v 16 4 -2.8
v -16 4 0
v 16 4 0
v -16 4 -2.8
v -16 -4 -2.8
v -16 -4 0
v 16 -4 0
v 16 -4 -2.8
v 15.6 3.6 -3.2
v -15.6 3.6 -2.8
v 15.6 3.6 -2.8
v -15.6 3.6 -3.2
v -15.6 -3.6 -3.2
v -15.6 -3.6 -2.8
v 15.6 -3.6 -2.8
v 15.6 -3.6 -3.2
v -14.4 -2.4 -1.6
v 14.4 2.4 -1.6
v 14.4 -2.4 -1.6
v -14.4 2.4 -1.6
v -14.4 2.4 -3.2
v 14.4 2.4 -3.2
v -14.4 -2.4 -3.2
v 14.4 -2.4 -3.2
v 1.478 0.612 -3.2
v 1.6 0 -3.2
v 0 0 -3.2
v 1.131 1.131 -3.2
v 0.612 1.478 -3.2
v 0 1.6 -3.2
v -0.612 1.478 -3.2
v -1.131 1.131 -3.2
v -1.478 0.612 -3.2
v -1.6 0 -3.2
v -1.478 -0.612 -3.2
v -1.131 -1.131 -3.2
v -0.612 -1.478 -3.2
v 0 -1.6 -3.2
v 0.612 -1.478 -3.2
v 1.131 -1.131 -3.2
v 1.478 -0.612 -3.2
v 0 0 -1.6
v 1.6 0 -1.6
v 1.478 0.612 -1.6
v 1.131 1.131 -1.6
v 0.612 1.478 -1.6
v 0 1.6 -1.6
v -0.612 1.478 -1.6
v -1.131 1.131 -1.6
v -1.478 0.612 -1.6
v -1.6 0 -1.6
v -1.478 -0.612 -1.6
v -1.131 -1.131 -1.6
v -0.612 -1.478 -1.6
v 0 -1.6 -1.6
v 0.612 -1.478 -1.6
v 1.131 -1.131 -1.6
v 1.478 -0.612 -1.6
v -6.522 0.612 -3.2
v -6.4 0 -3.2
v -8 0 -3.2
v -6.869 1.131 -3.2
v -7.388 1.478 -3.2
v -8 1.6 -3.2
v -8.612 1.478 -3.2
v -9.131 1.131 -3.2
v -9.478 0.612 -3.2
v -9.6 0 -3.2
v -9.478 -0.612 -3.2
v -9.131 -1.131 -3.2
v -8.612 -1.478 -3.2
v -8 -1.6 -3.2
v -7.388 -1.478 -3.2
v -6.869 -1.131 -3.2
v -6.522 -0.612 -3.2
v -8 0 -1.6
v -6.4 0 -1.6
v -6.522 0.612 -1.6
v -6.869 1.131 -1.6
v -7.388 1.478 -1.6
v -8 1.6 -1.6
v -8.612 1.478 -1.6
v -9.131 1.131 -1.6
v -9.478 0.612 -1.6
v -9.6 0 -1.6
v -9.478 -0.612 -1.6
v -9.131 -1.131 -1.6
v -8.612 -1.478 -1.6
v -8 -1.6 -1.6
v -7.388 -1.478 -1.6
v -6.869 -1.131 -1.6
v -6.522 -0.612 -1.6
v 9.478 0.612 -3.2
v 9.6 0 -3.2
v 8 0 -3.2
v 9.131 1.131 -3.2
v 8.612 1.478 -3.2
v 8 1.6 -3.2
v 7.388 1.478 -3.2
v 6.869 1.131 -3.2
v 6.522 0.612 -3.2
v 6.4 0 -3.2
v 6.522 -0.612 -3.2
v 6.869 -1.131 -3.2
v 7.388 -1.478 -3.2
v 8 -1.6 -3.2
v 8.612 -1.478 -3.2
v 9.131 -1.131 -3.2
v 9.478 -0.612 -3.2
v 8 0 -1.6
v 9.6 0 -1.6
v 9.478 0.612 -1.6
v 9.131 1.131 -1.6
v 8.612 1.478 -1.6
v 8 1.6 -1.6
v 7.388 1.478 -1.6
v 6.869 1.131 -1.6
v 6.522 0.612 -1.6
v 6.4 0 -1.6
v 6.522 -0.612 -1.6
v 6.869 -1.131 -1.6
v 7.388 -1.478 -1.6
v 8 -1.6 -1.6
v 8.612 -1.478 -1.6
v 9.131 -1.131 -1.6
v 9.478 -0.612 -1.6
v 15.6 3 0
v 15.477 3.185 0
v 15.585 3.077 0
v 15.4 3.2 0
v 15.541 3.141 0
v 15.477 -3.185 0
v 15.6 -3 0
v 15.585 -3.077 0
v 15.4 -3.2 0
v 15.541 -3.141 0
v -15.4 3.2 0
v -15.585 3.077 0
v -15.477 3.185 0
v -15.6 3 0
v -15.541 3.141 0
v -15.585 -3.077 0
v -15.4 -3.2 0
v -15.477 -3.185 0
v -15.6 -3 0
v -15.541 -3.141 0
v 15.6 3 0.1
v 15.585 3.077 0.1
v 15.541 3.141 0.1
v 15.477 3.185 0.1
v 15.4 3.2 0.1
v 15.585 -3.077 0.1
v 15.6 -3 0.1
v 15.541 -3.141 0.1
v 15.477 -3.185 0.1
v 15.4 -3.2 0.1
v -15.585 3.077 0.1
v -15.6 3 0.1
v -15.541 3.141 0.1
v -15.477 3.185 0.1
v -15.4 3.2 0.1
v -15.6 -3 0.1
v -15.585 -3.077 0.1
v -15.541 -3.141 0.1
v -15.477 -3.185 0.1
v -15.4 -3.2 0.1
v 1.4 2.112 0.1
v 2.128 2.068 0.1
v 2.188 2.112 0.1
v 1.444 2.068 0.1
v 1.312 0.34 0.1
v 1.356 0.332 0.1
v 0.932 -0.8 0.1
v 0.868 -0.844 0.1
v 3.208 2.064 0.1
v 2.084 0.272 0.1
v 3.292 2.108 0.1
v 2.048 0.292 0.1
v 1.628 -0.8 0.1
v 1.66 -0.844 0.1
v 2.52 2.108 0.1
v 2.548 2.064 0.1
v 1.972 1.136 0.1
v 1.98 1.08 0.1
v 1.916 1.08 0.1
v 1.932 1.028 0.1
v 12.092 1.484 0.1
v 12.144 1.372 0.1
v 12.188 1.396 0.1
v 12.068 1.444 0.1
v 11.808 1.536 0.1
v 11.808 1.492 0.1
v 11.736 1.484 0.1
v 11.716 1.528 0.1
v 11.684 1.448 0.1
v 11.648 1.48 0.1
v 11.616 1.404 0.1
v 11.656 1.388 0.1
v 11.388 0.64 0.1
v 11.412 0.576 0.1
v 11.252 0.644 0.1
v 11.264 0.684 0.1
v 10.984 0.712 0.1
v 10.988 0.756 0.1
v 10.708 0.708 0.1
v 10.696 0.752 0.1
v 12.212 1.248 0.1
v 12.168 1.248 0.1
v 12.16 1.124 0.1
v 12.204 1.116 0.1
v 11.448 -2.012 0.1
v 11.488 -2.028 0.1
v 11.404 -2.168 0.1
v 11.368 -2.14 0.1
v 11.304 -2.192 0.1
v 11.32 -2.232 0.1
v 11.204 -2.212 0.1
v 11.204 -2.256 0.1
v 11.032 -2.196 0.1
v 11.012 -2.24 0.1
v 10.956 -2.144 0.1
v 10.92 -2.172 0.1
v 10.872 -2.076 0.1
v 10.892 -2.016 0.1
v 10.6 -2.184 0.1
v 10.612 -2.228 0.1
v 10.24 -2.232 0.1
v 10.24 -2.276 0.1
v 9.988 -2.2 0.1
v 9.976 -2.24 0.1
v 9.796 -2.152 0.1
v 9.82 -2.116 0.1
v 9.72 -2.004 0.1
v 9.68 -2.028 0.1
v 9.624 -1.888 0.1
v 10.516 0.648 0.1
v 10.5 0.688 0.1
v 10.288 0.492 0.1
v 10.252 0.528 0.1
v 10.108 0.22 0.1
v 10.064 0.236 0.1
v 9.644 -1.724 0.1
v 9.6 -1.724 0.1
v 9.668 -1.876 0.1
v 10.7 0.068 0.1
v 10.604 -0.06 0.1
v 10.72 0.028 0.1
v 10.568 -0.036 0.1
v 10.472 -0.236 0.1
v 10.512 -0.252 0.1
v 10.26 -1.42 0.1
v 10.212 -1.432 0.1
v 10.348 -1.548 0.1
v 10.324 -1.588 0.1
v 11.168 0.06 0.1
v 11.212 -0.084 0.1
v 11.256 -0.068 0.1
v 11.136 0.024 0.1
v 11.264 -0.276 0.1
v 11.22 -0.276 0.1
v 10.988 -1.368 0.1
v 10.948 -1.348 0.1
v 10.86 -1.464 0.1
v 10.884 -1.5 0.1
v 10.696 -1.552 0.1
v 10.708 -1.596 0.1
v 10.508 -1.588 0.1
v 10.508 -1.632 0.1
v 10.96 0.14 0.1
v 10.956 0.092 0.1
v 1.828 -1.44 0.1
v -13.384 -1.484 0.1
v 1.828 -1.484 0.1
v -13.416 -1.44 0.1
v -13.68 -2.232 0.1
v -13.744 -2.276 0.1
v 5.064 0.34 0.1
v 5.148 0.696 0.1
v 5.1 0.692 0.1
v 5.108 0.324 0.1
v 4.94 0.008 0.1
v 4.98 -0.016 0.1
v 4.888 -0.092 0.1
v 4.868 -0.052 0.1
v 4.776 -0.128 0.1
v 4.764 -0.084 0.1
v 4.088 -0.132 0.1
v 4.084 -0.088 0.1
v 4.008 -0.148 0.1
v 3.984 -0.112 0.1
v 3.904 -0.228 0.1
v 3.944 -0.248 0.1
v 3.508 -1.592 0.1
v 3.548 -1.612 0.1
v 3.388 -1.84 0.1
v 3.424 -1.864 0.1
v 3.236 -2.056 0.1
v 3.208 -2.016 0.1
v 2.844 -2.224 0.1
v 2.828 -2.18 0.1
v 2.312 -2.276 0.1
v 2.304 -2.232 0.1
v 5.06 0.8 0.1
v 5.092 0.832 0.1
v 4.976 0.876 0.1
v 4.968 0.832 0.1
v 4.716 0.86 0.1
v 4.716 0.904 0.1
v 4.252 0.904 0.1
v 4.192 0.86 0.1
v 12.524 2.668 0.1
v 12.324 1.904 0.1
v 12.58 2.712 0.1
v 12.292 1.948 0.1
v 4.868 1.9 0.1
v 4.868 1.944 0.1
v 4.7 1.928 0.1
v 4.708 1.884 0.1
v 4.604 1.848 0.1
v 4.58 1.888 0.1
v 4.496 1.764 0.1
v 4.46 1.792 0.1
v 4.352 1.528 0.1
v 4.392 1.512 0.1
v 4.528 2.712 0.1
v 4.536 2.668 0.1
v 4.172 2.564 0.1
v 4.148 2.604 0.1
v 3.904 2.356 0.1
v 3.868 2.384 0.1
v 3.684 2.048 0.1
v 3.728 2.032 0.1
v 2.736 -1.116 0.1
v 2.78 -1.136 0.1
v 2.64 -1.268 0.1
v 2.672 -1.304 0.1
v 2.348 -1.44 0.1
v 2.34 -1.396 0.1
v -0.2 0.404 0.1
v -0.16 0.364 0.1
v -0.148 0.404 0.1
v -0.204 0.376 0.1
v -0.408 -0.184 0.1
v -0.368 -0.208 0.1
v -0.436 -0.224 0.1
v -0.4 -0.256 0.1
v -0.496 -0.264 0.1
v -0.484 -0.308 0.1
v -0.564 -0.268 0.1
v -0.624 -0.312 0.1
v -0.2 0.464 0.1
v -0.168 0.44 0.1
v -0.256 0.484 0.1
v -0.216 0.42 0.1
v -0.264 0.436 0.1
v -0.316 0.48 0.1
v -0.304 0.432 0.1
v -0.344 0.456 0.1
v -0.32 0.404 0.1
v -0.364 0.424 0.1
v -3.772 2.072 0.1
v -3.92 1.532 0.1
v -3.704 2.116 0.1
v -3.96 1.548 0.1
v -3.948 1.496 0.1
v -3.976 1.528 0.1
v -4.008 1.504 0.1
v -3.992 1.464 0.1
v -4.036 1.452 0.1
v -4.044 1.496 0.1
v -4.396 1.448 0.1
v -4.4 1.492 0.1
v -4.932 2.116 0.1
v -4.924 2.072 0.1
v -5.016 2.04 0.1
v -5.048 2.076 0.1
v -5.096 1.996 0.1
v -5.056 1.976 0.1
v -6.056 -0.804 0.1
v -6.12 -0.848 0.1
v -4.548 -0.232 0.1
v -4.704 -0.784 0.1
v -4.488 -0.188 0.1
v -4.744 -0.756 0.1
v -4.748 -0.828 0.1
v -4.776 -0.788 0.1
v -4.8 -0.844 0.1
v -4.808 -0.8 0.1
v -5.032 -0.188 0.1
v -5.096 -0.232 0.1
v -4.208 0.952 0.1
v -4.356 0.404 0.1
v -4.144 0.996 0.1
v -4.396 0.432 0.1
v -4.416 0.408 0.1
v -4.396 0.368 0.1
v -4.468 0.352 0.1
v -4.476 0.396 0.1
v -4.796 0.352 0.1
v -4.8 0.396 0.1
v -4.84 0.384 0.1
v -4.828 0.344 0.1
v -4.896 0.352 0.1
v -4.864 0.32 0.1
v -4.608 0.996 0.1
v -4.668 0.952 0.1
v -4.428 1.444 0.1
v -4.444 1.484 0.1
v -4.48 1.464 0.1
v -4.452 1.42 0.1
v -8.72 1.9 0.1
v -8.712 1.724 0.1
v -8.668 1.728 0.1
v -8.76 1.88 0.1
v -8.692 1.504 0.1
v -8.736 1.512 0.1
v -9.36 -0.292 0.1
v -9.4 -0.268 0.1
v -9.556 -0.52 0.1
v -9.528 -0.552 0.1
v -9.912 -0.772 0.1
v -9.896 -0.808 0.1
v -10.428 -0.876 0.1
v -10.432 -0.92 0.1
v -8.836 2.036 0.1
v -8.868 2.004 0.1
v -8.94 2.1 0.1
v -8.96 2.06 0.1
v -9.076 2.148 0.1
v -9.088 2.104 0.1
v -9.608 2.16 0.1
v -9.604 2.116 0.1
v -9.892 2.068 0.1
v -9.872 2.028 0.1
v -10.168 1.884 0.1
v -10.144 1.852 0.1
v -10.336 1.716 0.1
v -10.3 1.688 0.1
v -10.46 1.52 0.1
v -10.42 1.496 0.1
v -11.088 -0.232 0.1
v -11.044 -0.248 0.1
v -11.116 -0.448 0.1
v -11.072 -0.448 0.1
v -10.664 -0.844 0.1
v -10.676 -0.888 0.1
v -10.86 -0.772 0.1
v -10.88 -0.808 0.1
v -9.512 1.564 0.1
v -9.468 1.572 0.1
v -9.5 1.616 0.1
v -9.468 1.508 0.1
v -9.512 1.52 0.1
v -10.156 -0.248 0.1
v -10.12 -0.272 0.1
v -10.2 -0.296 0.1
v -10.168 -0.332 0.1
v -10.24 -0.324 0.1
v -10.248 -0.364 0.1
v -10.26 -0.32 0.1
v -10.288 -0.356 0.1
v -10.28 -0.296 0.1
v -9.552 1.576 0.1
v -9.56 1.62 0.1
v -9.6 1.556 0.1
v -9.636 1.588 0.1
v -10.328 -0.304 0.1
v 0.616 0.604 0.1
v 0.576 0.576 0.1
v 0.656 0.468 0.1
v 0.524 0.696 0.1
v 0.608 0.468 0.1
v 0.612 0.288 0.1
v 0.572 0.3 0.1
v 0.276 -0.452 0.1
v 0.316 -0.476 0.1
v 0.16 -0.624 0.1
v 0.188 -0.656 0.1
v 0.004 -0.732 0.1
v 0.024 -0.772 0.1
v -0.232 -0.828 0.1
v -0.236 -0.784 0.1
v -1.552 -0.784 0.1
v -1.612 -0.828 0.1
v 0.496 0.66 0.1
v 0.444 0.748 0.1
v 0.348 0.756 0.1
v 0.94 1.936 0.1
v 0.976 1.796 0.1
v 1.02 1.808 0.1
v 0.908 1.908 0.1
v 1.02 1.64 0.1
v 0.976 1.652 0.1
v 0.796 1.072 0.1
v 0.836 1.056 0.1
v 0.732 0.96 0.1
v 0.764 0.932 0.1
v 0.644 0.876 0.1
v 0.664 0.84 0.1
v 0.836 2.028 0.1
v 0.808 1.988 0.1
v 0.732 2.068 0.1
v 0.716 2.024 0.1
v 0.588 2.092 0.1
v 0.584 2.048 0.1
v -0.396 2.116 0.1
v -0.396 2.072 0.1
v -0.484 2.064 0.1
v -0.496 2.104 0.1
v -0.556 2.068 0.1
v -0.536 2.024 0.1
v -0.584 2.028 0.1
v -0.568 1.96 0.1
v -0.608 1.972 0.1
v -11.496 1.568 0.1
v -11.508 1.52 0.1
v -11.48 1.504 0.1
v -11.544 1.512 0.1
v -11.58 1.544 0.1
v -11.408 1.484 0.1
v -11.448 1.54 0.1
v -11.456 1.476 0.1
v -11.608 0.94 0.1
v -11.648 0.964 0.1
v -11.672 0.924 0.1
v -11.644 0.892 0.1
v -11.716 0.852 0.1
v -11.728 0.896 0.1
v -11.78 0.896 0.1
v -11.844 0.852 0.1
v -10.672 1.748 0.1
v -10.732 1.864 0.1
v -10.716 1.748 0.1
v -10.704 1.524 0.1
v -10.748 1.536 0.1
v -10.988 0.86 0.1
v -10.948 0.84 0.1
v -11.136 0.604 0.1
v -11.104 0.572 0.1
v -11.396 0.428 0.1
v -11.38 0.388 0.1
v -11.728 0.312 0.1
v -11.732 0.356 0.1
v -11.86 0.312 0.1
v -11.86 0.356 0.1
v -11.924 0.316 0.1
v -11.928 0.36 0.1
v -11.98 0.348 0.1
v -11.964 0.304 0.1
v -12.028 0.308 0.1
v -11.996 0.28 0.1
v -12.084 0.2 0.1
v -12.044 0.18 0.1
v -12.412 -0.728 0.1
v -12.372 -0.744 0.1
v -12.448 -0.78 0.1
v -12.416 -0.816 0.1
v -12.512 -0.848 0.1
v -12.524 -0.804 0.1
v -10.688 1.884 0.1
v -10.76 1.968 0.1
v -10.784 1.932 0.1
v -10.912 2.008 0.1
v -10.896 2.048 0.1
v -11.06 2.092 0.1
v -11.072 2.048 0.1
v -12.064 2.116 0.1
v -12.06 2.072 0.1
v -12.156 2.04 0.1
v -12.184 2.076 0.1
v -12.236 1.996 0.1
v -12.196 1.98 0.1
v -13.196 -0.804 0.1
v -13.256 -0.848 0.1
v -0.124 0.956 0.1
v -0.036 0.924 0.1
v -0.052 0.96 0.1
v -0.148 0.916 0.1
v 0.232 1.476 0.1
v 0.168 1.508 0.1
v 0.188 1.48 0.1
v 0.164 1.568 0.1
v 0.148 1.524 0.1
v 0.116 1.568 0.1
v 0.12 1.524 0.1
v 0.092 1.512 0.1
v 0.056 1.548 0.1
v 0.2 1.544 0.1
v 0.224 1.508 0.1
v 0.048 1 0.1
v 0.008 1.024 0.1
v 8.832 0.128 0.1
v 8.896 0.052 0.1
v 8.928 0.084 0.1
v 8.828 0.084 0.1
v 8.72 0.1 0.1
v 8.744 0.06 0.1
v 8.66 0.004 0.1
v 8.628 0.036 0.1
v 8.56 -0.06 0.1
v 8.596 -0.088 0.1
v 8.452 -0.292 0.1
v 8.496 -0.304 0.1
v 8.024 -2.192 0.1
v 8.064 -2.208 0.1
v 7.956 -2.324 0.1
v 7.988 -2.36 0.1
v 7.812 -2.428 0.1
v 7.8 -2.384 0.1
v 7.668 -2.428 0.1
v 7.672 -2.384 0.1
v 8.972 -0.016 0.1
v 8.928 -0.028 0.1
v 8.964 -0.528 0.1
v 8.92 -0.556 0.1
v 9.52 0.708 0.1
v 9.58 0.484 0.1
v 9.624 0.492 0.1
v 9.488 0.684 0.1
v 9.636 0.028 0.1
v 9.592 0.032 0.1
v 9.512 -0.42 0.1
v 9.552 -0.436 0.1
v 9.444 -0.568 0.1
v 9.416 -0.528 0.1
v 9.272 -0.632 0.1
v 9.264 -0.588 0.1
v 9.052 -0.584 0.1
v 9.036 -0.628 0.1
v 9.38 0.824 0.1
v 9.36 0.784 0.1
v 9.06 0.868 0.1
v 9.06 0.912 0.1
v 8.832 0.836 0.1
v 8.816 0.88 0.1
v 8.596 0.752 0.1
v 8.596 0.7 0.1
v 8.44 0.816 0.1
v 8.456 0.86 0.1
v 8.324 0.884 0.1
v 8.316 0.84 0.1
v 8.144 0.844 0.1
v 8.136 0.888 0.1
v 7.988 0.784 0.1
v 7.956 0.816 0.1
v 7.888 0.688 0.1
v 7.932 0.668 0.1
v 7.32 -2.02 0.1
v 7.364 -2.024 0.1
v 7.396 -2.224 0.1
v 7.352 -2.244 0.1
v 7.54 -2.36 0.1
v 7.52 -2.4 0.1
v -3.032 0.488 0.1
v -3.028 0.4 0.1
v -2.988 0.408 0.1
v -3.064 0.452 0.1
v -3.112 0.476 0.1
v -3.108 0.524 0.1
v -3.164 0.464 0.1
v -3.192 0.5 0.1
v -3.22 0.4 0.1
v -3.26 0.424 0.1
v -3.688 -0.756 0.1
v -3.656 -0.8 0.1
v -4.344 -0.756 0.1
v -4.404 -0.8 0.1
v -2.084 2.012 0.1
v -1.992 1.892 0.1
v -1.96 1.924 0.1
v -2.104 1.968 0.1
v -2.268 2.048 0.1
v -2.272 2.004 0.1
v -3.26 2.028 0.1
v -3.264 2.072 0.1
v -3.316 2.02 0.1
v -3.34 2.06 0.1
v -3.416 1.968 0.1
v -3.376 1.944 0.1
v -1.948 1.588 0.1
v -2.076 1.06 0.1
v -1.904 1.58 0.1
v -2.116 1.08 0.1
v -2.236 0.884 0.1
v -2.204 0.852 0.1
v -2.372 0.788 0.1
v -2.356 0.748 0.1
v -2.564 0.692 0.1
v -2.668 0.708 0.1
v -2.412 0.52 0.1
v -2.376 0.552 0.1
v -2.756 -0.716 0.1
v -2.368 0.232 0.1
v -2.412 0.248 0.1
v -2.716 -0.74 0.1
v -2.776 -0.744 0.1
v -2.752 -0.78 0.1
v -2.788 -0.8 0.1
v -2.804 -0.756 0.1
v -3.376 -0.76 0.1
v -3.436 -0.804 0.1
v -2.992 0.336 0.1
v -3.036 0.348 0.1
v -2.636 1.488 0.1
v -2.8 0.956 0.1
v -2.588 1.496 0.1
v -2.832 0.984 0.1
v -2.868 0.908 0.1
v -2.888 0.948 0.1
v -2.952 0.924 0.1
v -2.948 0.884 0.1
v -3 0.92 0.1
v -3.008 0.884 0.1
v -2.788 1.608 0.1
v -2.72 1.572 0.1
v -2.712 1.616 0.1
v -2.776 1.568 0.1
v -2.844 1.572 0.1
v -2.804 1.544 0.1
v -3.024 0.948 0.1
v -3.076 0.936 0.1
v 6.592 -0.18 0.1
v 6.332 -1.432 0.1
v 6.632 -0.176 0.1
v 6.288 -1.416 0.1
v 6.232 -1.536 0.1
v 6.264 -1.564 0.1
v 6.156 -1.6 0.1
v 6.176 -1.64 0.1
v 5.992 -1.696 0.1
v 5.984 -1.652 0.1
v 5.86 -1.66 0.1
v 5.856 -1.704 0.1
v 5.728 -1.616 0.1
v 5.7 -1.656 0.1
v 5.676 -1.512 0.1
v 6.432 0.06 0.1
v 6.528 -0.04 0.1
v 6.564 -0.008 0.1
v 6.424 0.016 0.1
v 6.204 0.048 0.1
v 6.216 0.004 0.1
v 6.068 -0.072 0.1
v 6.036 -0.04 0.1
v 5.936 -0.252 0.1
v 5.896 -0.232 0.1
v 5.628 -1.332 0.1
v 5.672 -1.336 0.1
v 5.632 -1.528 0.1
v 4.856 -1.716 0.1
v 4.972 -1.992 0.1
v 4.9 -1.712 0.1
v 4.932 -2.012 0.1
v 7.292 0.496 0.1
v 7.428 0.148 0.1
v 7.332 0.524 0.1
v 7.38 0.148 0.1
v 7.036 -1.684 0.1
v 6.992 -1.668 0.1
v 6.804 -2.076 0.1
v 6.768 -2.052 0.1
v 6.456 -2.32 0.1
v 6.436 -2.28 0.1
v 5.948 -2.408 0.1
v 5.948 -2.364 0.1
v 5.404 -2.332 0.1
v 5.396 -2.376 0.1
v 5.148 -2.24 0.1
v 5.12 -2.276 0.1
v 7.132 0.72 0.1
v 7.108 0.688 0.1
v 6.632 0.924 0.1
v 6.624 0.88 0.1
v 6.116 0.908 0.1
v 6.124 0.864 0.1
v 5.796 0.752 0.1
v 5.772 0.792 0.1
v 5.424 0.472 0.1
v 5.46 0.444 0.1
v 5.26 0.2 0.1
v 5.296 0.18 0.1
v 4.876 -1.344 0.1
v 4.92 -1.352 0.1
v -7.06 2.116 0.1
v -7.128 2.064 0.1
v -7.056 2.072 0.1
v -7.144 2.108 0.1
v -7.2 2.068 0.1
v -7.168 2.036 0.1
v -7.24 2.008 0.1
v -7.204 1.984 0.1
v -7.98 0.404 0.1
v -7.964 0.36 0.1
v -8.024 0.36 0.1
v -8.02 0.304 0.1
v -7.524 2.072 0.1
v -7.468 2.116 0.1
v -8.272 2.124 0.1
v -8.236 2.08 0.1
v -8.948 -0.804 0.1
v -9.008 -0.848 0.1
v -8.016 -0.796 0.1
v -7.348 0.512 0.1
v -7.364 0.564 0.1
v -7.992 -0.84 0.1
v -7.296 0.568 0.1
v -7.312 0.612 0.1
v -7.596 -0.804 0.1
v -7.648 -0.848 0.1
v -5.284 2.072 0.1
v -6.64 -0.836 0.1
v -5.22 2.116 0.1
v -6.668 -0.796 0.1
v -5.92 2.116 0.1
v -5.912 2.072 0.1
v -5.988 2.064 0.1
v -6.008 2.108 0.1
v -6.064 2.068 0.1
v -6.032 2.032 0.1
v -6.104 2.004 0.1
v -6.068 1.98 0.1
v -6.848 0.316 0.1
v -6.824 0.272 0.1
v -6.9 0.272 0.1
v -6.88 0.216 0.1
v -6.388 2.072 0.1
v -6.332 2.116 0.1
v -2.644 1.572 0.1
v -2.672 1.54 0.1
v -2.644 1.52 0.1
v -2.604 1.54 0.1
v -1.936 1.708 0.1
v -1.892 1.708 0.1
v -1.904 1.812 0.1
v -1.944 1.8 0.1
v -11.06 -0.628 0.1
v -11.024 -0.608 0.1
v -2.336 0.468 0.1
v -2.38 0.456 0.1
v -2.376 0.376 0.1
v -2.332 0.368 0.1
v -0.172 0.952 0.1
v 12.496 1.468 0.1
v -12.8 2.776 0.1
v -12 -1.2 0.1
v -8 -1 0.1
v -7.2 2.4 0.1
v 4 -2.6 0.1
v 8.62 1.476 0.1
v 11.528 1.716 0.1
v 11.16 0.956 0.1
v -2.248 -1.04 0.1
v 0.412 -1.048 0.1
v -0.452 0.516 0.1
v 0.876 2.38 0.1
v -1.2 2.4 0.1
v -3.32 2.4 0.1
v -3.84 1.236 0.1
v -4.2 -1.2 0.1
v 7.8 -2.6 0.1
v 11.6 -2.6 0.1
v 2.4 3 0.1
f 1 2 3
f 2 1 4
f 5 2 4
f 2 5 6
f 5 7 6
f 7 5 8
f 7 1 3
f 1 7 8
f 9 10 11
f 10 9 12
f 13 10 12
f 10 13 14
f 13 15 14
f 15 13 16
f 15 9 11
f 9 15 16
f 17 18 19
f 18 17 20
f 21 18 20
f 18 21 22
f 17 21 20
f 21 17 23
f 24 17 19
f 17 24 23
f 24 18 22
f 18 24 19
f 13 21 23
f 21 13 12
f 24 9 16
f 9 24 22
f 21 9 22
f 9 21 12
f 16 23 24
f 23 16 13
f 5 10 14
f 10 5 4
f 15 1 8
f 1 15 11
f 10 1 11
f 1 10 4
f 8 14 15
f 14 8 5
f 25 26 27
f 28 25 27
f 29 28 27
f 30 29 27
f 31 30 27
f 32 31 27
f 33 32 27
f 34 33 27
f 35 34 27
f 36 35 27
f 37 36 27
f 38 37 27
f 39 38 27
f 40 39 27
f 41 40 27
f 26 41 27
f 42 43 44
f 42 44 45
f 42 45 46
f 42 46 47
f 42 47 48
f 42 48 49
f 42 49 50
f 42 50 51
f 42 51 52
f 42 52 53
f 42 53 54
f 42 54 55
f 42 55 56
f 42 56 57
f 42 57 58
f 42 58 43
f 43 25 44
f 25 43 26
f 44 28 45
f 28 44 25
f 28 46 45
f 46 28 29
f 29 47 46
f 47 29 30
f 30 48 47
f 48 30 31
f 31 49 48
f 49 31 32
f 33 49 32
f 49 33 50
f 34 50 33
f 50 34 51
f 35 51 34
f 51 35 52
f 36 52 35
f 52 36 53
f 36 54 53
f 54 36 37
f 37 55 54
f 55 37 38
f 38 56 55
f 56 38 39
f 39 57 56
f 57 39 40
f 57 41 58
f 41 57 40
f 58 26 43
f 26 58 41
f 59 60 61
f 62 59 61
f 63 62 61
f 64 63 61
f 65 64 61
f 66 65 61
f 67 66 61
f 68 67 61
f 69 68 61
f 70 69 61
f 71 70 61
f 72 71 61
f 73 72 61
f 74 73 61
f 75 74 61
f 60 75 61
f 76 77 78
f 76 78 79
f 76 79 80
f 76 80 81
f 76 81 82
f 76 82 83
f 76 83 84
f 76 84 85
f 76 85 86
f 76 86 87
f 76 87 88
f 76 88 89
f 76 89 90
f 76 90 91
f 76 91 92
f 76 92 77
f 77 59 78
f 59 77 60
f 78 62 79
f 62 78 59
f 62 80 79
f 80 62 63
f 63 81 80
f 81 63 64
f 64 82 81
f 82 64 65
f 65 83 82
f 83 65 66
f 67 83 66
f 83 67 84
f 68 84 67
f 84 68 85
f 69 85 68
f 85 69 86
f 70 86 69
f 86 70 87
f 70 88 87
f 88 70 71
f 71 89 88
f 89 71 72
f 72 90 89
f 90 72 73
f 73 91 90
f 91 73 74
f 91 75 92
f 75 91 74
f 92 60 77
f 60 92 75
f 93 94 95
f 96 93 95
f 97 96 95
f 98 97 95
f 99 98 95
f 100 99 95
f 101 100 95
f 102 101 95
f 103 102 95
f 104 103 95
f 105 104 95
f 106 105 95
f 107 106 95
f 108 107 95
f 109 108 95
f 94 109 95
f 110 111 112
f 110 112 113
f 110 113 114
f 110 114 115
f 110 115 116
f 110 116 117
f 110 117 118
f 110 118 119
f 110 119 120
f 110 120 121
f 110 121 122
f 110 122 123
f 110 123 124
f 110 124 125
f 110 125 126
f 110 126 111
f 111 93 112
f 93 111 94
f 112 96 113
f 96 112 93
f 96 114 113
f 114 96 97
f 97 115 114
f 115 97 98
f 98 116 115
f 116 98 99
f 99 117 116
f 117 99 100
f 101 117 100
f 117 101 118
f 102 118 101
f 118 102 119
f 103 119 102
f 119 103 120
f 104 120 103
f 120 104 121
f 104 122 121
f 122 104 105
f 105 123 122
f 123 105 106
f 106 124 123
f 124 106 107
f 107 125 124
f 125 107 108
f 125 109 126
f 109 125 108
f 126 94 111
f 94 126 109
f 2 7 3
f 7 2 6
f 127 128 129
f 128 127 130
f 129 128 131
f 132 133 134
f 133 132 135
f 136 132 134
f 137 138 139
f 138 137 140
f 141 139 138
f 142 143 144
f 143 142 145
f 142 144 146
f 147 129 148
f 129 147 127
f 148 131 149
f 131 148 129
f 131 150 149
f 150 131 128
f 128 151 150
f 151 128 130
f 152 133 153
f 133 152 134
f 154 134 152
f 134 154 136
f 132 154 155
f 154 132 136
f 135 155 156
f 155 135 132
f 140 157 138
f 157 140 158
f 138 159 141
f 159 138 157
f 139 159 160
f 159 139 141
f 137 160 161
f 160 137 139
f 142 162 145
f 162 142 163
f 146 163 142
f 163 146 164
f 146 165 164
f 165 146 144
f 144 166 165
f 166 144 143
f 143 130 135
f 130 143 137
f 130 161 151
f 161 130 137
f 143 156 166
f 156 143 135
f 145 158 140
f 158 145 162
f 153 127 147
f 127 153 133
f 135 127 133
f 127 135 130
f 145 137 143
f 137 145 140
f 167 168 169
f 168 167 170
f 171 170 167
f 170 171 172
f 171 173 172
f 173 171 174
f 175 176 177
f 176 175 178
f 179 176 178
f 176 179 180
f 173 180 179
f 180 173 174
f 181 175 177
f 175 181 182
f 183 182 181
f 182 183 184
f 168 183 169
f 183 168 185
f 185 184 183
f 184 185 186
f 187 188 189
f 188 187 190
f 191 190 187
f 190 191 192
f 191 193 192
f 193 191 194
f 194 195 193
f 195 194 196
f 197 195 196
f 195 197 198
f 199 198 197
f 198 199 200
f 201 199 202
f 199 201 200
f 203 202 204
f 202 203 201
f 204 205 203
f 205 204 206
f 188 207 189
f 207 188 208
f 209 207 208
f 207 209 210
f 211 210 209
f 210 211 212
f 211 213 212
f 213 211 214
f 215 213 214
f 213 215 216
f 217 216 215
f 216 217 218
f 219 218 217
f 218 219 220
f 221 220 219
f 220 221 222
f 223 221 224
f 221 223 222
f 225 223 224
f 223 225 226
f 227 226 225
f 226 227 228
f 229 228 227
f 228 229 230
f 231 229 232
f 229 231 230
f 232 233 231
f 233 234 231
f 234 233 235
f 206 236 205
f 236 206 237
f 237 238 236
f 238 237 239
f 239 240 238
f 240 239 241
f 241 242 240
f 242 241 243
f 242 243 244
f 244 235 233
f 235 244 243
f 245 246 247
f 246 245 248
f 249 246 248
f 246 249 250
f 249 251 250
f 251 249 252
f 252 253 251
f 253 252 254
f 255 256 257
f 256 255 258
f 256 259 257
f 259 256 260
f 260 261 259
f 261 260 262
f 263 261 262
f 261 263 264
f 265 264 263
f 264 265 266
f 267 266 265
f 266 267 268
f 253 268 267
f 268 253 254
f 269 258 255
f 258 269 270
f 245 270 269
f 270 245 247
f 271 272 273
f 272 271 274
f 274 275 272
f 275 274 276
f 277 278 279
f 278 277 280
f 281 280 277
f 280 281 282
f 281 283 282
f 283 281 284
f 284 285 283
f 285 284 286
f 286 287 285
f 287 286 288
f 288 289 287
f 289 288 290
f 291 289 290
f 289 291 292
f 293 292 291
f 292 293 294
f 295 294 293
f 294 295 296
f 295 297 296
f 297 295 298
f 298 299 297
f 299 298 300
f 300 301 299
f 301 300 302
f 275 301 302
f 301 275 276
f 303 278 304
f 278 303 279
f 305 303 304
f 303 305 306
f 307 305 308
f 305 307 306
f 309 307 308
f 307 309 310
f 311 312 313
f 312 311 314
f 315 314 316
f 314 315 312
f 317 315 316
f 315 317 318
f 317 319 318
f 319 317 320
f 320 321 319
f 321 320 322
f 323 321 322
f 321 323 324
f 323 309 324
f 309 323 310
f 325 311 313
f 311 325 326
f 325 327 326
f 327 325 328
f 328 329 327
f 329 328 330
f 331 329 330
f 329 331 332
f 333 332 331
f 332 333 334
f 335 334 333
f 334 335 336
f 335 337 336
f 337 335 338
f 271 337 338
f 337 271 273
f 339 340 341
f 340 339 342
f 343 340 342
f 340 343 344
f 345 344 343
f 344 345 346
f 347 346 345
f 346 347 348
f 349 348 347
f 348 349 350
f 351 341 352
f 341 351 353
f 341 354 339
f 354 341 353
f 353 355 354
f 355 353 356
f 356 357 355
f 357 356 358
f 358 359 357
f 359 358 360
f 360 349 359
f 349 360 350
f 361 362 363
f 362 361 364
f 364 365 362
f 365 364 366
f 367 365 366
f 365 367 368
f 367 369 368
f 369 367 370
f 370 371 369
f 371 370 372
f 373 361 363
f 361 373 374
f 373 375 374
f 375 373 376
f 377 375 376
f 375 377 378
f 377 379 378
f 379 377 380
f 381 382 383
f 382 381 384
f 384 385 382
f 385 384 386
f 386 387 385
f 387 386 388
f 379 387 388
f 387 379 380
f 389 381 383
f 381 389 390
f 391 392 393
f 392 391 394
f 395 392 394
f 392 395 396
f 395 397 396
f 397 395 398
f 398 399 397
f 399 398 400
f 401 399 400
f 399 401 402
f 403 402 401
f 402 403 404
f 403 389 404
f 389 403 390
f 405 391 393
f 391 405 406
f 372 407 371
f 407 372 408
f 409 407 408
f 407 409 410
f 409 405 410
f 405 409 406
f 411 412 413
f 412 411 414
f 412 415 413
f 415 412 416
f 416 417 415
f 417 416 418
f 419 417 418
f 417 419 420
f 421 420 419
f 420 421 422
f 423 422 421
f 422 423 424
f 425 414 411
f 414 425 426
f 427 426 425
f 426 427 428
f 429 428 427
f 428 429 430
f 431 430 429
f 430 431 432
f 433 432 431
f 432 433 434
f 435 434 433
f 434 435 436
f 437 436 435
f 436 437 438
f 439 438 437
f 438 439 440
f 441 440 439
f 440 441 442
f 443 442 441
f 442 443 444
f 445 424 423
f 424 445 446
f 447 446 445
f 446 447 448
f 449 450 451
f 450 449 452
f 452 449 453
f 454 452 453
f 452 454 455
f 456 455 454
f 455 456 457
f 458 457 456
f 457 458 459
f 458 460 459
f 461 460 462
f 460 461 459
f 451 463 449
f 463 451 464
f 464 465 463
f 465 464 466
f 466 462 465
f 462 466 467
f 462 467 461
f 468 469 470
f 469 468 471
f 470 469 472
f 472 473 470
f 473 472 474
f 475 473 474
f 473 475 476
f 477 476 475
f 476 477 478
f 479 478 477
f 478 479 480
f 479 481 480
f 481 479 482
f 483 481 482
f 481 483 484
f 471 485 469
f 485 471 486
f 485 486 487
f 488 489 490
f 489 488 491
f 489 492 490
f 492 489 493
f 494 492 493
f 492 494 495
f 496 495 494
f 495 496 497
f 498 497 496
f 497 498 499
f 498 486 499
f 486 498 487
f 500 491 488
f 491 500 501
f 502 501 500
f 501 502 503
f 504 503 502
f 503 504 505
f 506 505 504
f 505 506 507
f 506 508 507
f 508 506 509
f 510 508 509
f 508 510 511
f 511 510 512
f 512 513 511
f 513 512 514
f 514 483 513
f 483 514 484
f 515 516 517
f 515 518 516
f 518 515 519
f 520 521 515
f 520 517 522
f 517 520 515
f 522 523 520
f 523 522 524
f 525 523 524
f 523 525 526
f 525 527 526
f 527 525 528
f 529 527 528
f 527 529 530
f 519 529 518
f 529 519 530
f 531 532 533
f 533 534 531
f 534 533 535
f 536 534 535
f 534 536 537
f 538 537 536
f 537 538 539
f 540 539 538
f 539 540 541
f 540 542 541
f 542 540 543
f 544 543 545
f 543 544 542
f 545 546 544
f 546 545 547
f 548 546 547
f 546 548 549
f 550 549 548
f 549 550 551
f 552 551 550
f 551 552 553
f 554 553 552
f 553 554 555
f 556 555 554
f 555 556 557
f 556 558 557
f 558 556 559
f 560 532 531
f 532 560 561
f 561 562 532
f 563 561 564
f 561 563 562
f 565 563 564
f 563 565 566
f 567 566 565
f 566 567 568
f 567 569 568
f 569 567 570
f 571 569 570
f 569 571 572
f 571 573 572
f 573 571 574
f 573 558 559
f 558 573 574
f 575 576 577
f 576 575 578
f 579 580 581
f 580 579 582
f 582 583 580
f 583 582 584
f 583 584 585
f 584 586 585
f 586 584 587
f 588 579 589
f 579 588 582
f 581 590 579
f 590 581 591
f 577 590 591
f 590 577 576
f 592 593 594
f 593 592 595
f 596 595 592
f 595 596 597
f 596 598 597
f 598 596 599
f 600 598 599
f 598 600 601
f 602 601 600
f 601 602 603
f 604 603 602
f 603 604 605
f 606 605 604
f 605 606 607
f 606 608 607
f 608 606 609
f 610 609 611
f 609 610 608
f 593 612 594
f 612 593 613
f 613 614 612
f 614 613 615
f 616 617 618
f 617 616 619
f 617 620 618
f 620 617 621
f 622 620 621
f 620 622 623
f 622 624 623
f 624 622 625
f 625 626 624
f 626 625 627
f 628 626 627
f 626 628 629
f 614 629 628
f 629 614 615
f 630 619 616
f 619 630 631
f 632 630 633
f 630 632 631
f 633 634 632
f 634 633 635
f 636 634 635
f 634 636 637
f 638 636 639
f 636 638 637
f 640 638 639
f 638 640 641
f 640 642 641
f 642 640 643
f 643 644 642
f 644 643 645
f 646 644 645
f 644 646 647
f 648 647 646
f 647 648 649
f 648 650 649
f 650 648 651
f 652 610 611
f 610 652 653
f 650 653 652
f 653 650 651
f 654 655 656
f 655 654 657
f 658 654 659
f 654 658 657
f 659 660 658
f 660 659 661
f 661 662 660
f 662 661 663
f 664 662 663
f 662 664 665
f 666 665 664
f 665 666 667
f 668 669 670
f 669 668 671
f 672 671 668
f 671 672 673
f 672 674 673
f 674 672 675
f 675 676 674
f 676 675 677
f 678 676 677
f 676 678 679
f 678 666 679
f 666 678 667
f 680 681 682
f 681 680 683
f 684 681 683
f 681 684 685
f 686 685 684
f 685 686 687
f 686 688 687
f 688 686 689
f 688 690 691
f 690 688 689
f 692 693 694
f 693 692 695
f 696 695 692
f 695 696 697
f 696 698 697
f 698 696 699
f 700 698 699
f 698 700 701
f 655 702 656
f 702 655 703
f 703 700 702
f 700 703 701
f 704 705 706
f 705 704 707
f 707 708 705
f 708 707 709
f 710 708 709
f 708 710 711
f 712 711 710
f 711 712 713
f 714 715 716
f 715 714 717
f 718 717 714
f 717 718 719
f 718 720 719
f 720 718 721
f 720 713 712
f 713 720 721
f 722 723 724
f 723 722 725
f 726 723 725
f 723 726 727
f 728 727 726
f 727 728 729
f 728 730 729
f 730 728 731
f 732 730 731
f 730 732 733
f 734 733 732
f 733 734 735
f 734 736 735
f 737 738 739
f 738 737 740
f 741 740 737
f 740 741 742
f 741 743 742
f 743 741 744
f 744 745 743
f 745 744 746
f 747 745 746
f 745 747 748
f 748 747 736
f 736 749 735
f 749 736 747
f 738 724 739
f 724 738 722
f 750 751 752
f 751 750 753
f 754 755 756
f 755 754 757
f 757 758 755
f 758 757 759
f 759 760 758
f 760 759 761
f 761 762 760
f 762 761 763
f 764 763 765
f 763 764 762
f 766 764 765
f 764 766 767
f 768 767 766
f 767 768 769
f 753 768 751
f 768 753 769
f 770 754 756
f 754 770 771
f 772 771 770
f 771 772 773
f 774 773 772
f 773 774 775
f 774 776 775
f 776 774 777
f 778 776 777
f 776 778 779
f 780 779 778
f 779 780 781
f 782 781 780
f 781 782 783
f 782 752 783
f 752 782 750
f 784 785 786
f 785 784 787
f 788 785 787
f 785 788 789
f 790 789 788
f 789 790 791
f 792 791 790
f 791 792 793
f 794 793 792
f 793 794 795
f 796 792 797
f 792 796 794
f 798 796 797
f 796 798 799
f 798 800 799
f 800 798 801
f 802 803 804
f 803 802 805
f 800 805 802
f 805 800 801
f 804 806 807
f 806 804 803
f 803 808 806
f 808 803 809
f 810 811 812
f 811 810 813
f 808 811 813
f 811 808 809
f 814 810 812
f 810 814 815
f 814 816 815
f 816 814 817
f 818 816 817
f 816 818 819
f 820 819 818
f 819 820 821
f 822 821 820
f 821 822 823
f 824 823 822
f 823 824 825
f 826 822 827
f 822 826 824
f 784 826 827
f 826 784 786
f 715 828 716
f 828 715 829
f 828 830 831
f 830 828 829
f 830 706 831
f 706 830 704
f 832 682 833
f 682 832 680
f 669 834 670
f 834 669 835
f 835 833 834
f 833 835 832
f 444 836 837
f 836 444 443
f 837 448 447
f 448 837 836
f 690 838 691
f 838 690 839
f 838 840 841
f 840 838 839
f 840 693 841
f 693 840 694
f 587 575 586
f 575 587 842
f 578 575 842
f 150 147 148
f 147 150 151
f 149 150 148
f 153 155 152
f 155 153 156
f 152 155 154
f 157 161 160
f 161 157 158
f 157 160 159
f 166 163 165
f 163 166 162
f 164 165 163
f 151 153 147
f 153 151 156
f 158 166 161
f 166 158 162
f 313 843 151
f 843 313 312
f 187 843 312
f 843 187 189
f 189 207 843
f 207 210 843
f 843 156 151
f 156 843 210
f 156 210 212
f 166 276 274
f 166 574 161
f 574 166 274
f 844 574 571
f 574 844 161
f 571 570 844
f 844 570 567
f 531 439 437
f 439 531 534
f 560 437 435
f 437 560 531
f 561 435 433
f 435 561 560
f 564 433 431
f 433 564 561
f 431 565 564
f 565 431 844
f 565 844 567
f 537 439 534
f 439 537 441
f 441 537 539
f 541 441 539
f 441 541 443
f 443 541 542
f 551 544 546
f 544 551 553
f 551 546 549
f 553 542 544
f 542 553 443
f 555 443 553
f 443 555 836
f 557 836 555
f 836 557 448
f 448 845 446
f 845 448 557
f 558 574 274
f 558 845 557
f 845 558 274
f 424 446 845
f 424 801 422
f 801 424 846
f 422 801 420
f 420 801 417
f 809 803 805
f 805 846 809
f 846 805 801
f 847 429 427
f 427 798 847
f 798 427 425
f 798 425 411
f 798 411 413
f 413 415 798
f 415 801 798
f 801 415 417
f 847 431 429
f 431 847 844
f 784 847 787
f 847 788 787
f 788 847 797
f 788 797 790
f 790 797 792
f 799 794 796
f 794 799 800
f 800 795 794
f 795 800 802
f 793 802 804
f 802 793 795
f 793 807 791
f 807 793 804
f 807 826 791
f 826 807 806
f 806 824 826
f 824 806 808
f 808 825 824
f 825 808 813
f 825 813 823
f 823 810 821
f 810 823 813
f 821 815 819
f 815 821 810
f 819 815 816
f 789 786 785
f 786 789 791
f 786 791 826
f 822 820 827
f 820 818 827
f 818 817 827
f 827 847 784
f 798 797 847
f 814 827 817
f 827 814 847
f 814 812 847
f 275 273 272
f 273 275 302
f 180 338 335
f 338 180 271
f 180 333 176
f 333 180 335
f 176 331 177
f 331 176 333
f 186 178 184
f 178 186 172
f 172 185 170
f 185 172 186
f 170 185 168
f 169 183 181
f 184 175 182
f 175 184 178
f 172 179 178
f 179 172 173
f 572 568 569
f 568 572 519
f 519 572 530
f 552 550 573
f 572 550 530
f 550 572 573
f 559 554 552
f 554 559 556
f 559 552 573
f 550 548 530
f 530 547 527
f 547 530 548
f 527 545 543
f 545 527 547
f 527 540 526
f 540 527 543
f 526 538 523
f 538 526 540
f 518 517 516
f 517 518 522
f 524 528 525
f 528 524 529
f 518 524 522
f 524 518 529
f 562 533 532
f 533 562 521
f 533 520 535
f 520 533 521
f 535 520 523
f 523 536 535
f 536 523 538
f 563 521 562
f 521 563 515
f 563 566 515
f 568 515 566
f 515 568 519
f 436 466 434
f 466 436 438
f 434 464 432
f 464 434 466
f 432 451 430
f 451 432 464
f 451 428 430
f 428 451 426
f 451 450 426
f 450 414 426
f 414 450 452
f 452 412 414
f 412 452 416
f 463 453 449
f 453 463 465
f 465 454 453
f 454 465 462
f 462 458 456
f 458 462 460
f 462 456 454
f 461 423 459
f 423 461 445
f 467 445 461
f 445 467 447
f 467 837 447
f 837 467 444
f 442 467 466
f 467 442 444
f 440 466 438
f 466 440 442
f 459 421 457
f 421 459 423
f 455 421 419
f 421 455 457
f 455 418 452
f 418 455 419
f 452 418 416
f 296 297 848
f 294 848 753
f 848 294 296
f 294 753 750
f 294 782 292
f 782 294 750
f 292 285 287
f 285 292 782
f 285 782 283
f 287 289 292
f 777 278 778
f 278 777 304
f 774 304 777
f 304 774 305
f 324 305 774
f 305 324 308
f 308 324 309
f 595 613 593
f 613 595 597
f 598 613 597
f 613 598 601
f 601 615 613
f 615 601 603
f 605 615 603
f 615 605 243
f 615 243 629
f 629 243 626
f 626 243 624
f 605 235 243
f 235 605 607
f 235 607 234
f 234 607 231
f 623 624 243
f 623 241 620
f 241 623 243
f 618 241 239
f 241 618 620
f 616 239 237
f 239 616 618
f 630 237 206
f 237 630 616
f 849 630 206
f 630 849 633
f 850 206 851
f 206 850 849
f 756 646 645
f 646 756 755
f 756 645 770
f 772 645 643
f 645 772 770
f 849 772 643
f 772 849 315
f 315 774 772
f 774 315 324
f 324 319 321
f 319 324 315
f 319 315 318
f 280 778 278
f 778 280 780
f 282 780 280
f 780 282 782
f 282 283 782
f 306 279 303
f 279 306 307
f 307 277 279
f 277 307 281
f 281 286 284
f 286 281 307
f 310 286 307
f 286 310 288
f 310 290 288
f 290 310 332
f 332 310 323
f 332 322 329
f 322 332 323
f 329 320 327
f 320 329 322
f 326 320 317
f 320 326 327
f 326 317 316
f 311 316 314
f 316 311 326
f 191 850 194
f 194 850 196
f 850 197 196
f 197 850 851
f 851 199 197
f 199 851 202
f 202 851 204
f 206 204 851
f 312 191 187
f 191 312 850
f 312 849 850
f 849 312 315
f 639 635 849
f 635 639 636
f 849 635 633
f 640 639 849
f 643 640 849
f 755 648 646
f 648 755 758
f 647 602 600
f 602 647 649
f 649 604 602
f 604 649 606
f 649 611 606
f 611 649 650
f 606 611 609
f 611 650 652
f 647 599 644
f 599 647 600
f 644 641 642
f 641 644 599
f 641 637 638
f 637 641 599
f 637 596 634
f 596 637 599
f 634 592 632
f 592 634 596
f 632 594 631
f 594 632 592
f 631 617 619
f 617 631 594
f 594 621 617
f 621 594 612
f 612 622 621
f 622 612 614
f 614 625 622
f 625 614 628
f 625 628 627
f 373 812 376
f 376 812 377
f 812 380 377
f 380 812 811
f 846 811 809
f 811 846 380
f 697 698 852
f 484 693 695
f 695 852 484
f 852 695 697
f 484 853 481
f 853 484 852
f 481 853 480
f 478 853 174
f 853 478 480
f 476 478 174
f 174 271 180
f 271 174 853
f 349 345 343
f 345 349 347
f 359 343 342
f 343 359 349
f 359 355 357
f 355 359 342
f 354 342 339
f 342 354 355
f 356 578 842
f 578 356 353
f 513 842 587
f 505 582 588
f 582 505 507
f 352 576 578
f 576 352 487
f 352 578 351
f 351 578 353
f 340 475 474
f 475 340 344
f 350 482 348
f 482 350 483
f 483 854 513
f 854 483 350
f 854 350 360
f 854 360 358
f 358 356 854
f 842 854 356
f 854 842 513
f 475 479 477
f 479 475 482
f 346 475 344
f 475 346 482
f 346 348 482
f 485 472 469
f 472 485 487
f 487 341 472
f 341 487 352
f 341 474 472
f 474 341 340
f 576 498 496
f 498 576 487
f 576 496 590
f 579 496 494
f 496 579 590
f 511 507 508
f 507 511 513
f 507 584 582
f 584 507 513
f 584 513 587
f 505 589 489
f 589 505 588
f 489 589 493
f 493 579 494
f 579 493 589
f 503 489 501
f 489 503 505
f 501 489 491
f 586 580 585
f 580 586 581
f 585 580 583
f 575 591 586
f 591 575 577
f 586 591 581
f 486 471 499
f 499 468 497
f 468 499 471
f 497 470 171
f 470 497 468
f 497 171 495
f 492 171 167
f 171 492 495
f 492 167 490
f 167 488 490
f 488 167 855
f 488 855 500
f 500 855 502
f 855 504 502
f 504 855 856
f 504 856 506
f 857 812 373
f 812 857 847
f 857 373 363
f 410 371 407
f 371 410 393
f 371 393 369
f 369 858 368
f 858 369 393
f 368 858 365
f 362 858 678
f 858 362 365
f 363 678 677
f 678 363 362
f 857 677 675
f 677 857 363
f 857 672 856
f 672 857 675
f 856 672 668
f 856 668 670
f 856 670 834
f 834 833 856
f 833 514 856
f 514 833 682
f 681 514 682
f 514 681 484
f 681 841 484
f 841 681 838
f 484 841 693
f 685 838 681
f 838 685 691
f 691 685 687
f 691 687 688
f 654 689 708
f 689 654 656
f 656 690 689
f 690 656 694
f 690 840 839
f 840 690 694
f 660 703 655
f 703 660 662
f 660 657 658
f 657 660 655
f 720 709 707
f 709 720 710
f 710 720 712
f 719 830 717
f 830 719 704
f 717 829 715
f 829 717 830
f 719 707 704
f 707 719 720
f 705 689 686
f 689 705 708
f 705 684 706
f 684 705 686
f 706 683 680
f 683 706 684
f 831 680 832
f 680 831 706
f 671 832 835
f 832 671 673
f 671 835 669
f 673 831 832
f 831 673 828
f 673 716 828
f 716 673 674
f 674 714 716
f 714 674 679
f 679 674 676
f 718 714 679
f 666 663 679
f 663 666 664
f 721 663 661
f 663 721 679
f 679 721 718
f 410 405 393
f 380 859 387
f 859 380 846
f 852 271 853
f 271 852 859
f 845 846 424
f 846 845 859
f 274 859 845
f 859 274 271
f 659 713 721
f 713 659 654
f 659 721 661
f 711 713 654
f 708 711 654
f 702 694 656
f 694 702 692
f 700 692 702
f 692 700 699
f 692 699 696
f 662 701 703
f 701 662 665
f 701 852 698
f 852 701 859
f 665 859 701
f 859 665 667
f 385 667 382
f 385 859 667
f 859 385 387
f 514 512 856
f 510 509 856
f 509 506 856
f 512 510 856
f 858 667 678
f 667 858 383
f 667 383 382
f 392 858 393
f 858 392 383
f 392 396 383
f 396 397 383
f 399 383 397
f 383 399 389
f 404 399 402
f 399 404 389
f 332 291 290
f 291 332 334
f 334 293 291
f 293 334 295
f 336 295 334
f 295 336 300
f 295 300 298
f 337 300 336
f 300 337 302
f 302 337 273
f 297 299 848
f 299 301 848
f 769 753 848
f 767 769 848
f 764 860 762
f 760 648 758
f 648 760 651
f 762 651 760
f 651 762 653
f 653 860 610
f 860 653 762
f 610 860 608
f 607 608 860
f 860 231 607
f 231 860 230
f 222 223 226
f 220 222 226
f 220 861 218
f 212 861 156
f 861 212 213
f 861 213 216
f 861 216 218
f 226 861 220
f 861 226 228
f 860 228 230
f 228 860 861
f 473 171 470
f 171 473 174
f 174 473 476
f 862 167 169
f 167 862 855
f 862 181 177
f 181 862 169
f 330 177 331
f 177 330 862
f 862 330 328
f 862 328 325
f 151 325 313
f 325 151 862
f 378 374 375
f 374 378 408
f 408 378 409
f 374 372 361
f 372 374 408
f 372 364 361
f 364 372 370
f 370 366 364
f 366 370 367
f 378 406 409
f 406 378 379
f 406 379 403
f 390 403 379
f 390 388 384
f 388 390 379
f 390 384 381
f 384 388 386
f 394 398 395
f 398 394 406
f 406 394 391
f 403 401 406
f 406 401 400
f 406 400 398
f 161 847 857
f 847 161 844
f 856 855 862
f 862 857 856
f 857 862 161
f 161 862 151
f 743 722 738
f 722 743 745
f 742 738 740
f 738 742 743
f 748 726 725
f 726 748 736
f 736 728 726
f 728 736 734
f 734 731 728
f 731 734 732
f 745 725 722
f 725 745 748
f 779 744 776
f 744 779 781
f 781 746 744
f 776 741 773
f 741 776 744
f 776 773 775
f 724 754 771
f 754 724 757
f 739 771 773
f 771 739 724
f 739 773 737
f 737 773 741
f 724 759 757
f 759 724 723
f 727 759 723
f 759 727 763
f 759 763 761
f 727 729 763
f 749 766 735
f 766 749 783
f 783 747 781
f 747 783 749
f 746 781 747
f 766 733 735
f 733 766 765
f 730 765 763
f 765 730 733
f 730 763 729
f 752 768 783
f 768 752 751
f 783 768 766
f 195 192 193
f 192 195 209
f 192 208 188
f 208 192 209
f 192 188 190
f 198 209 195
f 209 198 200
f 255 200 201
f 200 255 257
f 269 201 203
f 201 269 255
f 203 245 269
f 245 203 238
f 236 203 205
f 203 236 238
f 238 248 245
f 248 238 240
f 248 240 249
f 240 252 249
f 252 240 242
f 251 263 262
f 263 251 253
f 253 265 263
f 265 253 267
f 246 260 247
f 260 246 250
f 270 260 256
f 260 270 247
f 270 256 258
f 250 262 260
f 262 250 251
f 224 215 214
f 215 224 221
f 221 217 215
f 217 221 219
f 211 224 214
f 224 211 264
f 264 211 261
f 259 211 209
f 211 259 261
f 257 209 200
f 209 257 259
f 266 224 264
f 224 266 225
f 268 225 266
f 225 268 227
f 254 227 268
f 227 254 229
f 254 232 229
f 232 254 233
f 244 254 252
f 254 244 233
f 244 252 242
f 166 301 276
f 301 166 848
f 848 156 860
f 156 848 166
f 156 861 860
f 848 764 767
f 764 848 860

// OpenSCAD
use <../lib.scad>
use <2431.scad>
use <6258203l.scad>
function ldraw_lib__2431dt0() = [
// 0 Tile  1 x  4 with "Power by Ford" Logo Sticker
// 0 Name: 2431dt0.dat
// 0 Author: Ulrich Röder [UR]
// 0 !LDRAW_ORG Shortcut UPDATE 2024-04
// 0 !LICENSE Licensed under CC BY 4.0 : see CAreadme.txt
// 
// 0 BFC CERTIFY CCW
  [0,"BFC","CERTIFY"],
  [0,"BFC","CCW"],
// 
// 0 !CATEGORY Sticker Shortcut
// 0 !KEYWORDS Mustang, Set 10265
// 
// 0 !HISTORY 2019-06-28 [PTadmin] Official Update 2019-01
// 0 !HISTORY 2024-05-27 [OrionP] Change category to Sticker Shortcut
// 0 !HISTORY 2024-05-28 [OrionP] Official Update 2024-04
// 
// 
// 1 16 0 0 0 1 0 0 0 1 0 0 0 1 2431.dat
  [1,16,0,0,0,1,0,0,0,1,0,0,0,1, ldraw_lib__2431()],
// 1 16 0 0 0 1 0 0 0 1 0 0 0 1 6258203l.dat
  [1,16,0,0,0,1,0,0,0,1,0,0,0,1, ldraw_lib__6258203l()],
];
module ldraw_lib__2431dt0(step=0, col=false, unit=2/5, alt=false, line=0.2, solid=!$preview)
    makepoly(ldraw_lib__2431dt0(), step=step, col=col, unit=unit, alt=alt, line=line, solid=solid);
ldraw_lib__2431dt0(line=0.2);
